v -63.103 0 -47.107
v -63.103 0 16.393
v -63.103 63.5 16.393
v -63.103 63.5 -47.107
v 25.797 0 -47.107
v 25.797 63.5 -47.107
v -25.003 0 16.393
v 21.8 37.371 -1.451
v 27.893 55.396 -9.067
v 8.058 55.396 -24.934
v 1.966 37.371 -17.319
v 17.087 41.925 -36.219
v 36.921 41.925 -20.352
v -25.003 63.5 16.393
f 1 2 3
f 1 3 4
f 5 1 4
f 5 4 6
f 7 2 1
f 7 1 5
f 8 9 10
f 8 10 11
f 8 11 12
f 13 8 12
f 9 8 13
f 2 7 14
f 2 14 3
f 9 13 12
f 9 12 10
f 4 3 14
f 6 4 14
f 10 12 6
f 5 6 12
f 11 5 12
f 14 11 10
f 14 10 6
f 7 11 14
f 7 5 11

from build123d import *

# Parameters (mm, degrees)
F1_DEPTH = 63.5
F3_DEPTH = 25.4


with BuildPart() as f1:
    # F0 (on Front) → F1 (new body)
    with BuildSketch(Plane.XZ):
        Polygon((-63.103128, 16.393103), (-63.103128, -47.106897), (25.796872, -47.106897), (-25.003128, 16.393103), align=None)
    extrude(amount=-F1_DEPTH)

    # F2 (on face) → F3 (join)
    with BuildSketch(Plane(origin=(-7.249174, 0, -5.799339), x_dir=(0, 1, 0), z_dir=(0.780869, 0, 0.624695))):
        Polygon((55.396065, -24.504127), (37.371274, -14.751914), (41.925259, -38.956322), align=None)
    extrude(amount=F3_DEPTH)


solid = f1.part
